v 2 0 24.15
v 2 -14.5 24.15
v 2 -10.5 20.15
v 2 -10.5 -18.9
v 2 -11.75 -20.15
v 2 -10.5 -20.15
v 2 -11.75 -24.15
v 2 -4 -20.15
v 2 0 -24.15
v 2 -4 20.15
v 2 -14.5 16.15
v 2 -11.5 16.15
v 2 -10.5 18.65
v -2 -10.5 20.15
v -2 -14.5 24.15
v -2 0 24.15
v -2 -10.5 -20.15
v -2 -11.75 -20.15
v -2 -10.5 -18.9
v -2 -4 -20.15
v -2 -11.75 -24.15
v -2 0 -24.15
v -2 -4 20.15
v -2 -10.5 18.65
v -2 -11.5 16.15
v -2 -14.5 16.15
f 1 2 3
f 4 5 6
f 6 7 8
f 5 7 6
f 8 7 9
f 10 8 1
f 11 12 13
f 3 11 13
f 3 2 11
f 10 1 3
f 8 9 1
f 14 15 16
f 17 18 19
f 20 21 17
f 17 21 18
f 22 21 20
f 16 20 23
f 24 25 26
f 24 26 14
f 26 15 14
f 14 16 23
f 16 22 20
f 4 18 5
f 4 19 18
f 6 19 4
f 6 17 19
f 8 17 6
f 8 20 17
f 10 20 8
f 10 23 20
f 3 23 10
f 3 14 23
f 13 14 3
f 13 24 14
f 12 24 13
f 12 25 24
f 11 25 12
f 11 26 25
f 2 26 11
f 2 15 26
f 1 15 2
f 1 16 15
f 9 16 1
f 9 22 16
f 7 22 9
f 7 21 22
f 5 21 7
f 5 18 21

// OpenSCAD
frame_h = 40.2;
frame_w = 6.4;

top_tooth_h = 4;
top_tooth_chamfer_d = 1;
top_tooth_chamfer_h = 2.5;
bottom_tooth_h = 1.25;

DEFAULT_FIT = 0.1;
DEFAULT_THICKNESS = 4;

module frame_holder_profile (thickness = DEFAULT_THICKNESS, fit = DEFAULT_FIT) {
  f_h = frame_h + fit;
  f_w = frame_w + fit;

  polygon([
    [0, 0],
    [0, f_h / 2 + thickness],
    [2 * thickness + f_w, f_h / 2 + thickness],
    [2 * thickness + f_w, f_h / 2 - top_tooth_h],
    [thickness + f_w + top_tooth_chamfer_d, f_h / 2 - top_tooth_h],
    [thickness + f_w , f_h / 2 - top_tooth_h + top_tooth_chamfer_h],
    [thickness + f_w, f_h / 2],
    [thickness, f_h / 2],
    [thickness, -f_h / 2],
    [thickness + f_w, -f_h / 2],
    [thickness + f_w, -f_h / 2 + bottom_tooth_h],
    [thickness + f_w+bottom_tooth_h, -f_h / 2],
    [thickness + f_w+bottom_tooth_h, -f_h / 2 - thickness],
    [0, -f_h / 2 - thickness],
  ]);
}

module frame_holder (width, thickness = DEFAULT_THICKNESS, fit = DEFAULT_FIT) {
  rotate([90, 0, 270]) // Rotate to printer coordinates
    translate([0, 0, -width / 2]) // Center our Z (X after rotation)
      linear_extrude(width)
        frame_holder_profile(thickness, fit);
}

module frame_holder_to_top (thickness = DEFAULT_THICKNESS, fit = DEFAULT_FIT) {
  translate([0, 0, (frame_h + fit) / 2 + thickness]) children();
}

module frame_holder_to_bottom (thickness = DEFAULT_THICKNESS, fit = DEFAULT_FIT) {
  translate([0, 0, -(frame_h + fit) / 2 - thickness]) children();
}

frame_holder(4);
